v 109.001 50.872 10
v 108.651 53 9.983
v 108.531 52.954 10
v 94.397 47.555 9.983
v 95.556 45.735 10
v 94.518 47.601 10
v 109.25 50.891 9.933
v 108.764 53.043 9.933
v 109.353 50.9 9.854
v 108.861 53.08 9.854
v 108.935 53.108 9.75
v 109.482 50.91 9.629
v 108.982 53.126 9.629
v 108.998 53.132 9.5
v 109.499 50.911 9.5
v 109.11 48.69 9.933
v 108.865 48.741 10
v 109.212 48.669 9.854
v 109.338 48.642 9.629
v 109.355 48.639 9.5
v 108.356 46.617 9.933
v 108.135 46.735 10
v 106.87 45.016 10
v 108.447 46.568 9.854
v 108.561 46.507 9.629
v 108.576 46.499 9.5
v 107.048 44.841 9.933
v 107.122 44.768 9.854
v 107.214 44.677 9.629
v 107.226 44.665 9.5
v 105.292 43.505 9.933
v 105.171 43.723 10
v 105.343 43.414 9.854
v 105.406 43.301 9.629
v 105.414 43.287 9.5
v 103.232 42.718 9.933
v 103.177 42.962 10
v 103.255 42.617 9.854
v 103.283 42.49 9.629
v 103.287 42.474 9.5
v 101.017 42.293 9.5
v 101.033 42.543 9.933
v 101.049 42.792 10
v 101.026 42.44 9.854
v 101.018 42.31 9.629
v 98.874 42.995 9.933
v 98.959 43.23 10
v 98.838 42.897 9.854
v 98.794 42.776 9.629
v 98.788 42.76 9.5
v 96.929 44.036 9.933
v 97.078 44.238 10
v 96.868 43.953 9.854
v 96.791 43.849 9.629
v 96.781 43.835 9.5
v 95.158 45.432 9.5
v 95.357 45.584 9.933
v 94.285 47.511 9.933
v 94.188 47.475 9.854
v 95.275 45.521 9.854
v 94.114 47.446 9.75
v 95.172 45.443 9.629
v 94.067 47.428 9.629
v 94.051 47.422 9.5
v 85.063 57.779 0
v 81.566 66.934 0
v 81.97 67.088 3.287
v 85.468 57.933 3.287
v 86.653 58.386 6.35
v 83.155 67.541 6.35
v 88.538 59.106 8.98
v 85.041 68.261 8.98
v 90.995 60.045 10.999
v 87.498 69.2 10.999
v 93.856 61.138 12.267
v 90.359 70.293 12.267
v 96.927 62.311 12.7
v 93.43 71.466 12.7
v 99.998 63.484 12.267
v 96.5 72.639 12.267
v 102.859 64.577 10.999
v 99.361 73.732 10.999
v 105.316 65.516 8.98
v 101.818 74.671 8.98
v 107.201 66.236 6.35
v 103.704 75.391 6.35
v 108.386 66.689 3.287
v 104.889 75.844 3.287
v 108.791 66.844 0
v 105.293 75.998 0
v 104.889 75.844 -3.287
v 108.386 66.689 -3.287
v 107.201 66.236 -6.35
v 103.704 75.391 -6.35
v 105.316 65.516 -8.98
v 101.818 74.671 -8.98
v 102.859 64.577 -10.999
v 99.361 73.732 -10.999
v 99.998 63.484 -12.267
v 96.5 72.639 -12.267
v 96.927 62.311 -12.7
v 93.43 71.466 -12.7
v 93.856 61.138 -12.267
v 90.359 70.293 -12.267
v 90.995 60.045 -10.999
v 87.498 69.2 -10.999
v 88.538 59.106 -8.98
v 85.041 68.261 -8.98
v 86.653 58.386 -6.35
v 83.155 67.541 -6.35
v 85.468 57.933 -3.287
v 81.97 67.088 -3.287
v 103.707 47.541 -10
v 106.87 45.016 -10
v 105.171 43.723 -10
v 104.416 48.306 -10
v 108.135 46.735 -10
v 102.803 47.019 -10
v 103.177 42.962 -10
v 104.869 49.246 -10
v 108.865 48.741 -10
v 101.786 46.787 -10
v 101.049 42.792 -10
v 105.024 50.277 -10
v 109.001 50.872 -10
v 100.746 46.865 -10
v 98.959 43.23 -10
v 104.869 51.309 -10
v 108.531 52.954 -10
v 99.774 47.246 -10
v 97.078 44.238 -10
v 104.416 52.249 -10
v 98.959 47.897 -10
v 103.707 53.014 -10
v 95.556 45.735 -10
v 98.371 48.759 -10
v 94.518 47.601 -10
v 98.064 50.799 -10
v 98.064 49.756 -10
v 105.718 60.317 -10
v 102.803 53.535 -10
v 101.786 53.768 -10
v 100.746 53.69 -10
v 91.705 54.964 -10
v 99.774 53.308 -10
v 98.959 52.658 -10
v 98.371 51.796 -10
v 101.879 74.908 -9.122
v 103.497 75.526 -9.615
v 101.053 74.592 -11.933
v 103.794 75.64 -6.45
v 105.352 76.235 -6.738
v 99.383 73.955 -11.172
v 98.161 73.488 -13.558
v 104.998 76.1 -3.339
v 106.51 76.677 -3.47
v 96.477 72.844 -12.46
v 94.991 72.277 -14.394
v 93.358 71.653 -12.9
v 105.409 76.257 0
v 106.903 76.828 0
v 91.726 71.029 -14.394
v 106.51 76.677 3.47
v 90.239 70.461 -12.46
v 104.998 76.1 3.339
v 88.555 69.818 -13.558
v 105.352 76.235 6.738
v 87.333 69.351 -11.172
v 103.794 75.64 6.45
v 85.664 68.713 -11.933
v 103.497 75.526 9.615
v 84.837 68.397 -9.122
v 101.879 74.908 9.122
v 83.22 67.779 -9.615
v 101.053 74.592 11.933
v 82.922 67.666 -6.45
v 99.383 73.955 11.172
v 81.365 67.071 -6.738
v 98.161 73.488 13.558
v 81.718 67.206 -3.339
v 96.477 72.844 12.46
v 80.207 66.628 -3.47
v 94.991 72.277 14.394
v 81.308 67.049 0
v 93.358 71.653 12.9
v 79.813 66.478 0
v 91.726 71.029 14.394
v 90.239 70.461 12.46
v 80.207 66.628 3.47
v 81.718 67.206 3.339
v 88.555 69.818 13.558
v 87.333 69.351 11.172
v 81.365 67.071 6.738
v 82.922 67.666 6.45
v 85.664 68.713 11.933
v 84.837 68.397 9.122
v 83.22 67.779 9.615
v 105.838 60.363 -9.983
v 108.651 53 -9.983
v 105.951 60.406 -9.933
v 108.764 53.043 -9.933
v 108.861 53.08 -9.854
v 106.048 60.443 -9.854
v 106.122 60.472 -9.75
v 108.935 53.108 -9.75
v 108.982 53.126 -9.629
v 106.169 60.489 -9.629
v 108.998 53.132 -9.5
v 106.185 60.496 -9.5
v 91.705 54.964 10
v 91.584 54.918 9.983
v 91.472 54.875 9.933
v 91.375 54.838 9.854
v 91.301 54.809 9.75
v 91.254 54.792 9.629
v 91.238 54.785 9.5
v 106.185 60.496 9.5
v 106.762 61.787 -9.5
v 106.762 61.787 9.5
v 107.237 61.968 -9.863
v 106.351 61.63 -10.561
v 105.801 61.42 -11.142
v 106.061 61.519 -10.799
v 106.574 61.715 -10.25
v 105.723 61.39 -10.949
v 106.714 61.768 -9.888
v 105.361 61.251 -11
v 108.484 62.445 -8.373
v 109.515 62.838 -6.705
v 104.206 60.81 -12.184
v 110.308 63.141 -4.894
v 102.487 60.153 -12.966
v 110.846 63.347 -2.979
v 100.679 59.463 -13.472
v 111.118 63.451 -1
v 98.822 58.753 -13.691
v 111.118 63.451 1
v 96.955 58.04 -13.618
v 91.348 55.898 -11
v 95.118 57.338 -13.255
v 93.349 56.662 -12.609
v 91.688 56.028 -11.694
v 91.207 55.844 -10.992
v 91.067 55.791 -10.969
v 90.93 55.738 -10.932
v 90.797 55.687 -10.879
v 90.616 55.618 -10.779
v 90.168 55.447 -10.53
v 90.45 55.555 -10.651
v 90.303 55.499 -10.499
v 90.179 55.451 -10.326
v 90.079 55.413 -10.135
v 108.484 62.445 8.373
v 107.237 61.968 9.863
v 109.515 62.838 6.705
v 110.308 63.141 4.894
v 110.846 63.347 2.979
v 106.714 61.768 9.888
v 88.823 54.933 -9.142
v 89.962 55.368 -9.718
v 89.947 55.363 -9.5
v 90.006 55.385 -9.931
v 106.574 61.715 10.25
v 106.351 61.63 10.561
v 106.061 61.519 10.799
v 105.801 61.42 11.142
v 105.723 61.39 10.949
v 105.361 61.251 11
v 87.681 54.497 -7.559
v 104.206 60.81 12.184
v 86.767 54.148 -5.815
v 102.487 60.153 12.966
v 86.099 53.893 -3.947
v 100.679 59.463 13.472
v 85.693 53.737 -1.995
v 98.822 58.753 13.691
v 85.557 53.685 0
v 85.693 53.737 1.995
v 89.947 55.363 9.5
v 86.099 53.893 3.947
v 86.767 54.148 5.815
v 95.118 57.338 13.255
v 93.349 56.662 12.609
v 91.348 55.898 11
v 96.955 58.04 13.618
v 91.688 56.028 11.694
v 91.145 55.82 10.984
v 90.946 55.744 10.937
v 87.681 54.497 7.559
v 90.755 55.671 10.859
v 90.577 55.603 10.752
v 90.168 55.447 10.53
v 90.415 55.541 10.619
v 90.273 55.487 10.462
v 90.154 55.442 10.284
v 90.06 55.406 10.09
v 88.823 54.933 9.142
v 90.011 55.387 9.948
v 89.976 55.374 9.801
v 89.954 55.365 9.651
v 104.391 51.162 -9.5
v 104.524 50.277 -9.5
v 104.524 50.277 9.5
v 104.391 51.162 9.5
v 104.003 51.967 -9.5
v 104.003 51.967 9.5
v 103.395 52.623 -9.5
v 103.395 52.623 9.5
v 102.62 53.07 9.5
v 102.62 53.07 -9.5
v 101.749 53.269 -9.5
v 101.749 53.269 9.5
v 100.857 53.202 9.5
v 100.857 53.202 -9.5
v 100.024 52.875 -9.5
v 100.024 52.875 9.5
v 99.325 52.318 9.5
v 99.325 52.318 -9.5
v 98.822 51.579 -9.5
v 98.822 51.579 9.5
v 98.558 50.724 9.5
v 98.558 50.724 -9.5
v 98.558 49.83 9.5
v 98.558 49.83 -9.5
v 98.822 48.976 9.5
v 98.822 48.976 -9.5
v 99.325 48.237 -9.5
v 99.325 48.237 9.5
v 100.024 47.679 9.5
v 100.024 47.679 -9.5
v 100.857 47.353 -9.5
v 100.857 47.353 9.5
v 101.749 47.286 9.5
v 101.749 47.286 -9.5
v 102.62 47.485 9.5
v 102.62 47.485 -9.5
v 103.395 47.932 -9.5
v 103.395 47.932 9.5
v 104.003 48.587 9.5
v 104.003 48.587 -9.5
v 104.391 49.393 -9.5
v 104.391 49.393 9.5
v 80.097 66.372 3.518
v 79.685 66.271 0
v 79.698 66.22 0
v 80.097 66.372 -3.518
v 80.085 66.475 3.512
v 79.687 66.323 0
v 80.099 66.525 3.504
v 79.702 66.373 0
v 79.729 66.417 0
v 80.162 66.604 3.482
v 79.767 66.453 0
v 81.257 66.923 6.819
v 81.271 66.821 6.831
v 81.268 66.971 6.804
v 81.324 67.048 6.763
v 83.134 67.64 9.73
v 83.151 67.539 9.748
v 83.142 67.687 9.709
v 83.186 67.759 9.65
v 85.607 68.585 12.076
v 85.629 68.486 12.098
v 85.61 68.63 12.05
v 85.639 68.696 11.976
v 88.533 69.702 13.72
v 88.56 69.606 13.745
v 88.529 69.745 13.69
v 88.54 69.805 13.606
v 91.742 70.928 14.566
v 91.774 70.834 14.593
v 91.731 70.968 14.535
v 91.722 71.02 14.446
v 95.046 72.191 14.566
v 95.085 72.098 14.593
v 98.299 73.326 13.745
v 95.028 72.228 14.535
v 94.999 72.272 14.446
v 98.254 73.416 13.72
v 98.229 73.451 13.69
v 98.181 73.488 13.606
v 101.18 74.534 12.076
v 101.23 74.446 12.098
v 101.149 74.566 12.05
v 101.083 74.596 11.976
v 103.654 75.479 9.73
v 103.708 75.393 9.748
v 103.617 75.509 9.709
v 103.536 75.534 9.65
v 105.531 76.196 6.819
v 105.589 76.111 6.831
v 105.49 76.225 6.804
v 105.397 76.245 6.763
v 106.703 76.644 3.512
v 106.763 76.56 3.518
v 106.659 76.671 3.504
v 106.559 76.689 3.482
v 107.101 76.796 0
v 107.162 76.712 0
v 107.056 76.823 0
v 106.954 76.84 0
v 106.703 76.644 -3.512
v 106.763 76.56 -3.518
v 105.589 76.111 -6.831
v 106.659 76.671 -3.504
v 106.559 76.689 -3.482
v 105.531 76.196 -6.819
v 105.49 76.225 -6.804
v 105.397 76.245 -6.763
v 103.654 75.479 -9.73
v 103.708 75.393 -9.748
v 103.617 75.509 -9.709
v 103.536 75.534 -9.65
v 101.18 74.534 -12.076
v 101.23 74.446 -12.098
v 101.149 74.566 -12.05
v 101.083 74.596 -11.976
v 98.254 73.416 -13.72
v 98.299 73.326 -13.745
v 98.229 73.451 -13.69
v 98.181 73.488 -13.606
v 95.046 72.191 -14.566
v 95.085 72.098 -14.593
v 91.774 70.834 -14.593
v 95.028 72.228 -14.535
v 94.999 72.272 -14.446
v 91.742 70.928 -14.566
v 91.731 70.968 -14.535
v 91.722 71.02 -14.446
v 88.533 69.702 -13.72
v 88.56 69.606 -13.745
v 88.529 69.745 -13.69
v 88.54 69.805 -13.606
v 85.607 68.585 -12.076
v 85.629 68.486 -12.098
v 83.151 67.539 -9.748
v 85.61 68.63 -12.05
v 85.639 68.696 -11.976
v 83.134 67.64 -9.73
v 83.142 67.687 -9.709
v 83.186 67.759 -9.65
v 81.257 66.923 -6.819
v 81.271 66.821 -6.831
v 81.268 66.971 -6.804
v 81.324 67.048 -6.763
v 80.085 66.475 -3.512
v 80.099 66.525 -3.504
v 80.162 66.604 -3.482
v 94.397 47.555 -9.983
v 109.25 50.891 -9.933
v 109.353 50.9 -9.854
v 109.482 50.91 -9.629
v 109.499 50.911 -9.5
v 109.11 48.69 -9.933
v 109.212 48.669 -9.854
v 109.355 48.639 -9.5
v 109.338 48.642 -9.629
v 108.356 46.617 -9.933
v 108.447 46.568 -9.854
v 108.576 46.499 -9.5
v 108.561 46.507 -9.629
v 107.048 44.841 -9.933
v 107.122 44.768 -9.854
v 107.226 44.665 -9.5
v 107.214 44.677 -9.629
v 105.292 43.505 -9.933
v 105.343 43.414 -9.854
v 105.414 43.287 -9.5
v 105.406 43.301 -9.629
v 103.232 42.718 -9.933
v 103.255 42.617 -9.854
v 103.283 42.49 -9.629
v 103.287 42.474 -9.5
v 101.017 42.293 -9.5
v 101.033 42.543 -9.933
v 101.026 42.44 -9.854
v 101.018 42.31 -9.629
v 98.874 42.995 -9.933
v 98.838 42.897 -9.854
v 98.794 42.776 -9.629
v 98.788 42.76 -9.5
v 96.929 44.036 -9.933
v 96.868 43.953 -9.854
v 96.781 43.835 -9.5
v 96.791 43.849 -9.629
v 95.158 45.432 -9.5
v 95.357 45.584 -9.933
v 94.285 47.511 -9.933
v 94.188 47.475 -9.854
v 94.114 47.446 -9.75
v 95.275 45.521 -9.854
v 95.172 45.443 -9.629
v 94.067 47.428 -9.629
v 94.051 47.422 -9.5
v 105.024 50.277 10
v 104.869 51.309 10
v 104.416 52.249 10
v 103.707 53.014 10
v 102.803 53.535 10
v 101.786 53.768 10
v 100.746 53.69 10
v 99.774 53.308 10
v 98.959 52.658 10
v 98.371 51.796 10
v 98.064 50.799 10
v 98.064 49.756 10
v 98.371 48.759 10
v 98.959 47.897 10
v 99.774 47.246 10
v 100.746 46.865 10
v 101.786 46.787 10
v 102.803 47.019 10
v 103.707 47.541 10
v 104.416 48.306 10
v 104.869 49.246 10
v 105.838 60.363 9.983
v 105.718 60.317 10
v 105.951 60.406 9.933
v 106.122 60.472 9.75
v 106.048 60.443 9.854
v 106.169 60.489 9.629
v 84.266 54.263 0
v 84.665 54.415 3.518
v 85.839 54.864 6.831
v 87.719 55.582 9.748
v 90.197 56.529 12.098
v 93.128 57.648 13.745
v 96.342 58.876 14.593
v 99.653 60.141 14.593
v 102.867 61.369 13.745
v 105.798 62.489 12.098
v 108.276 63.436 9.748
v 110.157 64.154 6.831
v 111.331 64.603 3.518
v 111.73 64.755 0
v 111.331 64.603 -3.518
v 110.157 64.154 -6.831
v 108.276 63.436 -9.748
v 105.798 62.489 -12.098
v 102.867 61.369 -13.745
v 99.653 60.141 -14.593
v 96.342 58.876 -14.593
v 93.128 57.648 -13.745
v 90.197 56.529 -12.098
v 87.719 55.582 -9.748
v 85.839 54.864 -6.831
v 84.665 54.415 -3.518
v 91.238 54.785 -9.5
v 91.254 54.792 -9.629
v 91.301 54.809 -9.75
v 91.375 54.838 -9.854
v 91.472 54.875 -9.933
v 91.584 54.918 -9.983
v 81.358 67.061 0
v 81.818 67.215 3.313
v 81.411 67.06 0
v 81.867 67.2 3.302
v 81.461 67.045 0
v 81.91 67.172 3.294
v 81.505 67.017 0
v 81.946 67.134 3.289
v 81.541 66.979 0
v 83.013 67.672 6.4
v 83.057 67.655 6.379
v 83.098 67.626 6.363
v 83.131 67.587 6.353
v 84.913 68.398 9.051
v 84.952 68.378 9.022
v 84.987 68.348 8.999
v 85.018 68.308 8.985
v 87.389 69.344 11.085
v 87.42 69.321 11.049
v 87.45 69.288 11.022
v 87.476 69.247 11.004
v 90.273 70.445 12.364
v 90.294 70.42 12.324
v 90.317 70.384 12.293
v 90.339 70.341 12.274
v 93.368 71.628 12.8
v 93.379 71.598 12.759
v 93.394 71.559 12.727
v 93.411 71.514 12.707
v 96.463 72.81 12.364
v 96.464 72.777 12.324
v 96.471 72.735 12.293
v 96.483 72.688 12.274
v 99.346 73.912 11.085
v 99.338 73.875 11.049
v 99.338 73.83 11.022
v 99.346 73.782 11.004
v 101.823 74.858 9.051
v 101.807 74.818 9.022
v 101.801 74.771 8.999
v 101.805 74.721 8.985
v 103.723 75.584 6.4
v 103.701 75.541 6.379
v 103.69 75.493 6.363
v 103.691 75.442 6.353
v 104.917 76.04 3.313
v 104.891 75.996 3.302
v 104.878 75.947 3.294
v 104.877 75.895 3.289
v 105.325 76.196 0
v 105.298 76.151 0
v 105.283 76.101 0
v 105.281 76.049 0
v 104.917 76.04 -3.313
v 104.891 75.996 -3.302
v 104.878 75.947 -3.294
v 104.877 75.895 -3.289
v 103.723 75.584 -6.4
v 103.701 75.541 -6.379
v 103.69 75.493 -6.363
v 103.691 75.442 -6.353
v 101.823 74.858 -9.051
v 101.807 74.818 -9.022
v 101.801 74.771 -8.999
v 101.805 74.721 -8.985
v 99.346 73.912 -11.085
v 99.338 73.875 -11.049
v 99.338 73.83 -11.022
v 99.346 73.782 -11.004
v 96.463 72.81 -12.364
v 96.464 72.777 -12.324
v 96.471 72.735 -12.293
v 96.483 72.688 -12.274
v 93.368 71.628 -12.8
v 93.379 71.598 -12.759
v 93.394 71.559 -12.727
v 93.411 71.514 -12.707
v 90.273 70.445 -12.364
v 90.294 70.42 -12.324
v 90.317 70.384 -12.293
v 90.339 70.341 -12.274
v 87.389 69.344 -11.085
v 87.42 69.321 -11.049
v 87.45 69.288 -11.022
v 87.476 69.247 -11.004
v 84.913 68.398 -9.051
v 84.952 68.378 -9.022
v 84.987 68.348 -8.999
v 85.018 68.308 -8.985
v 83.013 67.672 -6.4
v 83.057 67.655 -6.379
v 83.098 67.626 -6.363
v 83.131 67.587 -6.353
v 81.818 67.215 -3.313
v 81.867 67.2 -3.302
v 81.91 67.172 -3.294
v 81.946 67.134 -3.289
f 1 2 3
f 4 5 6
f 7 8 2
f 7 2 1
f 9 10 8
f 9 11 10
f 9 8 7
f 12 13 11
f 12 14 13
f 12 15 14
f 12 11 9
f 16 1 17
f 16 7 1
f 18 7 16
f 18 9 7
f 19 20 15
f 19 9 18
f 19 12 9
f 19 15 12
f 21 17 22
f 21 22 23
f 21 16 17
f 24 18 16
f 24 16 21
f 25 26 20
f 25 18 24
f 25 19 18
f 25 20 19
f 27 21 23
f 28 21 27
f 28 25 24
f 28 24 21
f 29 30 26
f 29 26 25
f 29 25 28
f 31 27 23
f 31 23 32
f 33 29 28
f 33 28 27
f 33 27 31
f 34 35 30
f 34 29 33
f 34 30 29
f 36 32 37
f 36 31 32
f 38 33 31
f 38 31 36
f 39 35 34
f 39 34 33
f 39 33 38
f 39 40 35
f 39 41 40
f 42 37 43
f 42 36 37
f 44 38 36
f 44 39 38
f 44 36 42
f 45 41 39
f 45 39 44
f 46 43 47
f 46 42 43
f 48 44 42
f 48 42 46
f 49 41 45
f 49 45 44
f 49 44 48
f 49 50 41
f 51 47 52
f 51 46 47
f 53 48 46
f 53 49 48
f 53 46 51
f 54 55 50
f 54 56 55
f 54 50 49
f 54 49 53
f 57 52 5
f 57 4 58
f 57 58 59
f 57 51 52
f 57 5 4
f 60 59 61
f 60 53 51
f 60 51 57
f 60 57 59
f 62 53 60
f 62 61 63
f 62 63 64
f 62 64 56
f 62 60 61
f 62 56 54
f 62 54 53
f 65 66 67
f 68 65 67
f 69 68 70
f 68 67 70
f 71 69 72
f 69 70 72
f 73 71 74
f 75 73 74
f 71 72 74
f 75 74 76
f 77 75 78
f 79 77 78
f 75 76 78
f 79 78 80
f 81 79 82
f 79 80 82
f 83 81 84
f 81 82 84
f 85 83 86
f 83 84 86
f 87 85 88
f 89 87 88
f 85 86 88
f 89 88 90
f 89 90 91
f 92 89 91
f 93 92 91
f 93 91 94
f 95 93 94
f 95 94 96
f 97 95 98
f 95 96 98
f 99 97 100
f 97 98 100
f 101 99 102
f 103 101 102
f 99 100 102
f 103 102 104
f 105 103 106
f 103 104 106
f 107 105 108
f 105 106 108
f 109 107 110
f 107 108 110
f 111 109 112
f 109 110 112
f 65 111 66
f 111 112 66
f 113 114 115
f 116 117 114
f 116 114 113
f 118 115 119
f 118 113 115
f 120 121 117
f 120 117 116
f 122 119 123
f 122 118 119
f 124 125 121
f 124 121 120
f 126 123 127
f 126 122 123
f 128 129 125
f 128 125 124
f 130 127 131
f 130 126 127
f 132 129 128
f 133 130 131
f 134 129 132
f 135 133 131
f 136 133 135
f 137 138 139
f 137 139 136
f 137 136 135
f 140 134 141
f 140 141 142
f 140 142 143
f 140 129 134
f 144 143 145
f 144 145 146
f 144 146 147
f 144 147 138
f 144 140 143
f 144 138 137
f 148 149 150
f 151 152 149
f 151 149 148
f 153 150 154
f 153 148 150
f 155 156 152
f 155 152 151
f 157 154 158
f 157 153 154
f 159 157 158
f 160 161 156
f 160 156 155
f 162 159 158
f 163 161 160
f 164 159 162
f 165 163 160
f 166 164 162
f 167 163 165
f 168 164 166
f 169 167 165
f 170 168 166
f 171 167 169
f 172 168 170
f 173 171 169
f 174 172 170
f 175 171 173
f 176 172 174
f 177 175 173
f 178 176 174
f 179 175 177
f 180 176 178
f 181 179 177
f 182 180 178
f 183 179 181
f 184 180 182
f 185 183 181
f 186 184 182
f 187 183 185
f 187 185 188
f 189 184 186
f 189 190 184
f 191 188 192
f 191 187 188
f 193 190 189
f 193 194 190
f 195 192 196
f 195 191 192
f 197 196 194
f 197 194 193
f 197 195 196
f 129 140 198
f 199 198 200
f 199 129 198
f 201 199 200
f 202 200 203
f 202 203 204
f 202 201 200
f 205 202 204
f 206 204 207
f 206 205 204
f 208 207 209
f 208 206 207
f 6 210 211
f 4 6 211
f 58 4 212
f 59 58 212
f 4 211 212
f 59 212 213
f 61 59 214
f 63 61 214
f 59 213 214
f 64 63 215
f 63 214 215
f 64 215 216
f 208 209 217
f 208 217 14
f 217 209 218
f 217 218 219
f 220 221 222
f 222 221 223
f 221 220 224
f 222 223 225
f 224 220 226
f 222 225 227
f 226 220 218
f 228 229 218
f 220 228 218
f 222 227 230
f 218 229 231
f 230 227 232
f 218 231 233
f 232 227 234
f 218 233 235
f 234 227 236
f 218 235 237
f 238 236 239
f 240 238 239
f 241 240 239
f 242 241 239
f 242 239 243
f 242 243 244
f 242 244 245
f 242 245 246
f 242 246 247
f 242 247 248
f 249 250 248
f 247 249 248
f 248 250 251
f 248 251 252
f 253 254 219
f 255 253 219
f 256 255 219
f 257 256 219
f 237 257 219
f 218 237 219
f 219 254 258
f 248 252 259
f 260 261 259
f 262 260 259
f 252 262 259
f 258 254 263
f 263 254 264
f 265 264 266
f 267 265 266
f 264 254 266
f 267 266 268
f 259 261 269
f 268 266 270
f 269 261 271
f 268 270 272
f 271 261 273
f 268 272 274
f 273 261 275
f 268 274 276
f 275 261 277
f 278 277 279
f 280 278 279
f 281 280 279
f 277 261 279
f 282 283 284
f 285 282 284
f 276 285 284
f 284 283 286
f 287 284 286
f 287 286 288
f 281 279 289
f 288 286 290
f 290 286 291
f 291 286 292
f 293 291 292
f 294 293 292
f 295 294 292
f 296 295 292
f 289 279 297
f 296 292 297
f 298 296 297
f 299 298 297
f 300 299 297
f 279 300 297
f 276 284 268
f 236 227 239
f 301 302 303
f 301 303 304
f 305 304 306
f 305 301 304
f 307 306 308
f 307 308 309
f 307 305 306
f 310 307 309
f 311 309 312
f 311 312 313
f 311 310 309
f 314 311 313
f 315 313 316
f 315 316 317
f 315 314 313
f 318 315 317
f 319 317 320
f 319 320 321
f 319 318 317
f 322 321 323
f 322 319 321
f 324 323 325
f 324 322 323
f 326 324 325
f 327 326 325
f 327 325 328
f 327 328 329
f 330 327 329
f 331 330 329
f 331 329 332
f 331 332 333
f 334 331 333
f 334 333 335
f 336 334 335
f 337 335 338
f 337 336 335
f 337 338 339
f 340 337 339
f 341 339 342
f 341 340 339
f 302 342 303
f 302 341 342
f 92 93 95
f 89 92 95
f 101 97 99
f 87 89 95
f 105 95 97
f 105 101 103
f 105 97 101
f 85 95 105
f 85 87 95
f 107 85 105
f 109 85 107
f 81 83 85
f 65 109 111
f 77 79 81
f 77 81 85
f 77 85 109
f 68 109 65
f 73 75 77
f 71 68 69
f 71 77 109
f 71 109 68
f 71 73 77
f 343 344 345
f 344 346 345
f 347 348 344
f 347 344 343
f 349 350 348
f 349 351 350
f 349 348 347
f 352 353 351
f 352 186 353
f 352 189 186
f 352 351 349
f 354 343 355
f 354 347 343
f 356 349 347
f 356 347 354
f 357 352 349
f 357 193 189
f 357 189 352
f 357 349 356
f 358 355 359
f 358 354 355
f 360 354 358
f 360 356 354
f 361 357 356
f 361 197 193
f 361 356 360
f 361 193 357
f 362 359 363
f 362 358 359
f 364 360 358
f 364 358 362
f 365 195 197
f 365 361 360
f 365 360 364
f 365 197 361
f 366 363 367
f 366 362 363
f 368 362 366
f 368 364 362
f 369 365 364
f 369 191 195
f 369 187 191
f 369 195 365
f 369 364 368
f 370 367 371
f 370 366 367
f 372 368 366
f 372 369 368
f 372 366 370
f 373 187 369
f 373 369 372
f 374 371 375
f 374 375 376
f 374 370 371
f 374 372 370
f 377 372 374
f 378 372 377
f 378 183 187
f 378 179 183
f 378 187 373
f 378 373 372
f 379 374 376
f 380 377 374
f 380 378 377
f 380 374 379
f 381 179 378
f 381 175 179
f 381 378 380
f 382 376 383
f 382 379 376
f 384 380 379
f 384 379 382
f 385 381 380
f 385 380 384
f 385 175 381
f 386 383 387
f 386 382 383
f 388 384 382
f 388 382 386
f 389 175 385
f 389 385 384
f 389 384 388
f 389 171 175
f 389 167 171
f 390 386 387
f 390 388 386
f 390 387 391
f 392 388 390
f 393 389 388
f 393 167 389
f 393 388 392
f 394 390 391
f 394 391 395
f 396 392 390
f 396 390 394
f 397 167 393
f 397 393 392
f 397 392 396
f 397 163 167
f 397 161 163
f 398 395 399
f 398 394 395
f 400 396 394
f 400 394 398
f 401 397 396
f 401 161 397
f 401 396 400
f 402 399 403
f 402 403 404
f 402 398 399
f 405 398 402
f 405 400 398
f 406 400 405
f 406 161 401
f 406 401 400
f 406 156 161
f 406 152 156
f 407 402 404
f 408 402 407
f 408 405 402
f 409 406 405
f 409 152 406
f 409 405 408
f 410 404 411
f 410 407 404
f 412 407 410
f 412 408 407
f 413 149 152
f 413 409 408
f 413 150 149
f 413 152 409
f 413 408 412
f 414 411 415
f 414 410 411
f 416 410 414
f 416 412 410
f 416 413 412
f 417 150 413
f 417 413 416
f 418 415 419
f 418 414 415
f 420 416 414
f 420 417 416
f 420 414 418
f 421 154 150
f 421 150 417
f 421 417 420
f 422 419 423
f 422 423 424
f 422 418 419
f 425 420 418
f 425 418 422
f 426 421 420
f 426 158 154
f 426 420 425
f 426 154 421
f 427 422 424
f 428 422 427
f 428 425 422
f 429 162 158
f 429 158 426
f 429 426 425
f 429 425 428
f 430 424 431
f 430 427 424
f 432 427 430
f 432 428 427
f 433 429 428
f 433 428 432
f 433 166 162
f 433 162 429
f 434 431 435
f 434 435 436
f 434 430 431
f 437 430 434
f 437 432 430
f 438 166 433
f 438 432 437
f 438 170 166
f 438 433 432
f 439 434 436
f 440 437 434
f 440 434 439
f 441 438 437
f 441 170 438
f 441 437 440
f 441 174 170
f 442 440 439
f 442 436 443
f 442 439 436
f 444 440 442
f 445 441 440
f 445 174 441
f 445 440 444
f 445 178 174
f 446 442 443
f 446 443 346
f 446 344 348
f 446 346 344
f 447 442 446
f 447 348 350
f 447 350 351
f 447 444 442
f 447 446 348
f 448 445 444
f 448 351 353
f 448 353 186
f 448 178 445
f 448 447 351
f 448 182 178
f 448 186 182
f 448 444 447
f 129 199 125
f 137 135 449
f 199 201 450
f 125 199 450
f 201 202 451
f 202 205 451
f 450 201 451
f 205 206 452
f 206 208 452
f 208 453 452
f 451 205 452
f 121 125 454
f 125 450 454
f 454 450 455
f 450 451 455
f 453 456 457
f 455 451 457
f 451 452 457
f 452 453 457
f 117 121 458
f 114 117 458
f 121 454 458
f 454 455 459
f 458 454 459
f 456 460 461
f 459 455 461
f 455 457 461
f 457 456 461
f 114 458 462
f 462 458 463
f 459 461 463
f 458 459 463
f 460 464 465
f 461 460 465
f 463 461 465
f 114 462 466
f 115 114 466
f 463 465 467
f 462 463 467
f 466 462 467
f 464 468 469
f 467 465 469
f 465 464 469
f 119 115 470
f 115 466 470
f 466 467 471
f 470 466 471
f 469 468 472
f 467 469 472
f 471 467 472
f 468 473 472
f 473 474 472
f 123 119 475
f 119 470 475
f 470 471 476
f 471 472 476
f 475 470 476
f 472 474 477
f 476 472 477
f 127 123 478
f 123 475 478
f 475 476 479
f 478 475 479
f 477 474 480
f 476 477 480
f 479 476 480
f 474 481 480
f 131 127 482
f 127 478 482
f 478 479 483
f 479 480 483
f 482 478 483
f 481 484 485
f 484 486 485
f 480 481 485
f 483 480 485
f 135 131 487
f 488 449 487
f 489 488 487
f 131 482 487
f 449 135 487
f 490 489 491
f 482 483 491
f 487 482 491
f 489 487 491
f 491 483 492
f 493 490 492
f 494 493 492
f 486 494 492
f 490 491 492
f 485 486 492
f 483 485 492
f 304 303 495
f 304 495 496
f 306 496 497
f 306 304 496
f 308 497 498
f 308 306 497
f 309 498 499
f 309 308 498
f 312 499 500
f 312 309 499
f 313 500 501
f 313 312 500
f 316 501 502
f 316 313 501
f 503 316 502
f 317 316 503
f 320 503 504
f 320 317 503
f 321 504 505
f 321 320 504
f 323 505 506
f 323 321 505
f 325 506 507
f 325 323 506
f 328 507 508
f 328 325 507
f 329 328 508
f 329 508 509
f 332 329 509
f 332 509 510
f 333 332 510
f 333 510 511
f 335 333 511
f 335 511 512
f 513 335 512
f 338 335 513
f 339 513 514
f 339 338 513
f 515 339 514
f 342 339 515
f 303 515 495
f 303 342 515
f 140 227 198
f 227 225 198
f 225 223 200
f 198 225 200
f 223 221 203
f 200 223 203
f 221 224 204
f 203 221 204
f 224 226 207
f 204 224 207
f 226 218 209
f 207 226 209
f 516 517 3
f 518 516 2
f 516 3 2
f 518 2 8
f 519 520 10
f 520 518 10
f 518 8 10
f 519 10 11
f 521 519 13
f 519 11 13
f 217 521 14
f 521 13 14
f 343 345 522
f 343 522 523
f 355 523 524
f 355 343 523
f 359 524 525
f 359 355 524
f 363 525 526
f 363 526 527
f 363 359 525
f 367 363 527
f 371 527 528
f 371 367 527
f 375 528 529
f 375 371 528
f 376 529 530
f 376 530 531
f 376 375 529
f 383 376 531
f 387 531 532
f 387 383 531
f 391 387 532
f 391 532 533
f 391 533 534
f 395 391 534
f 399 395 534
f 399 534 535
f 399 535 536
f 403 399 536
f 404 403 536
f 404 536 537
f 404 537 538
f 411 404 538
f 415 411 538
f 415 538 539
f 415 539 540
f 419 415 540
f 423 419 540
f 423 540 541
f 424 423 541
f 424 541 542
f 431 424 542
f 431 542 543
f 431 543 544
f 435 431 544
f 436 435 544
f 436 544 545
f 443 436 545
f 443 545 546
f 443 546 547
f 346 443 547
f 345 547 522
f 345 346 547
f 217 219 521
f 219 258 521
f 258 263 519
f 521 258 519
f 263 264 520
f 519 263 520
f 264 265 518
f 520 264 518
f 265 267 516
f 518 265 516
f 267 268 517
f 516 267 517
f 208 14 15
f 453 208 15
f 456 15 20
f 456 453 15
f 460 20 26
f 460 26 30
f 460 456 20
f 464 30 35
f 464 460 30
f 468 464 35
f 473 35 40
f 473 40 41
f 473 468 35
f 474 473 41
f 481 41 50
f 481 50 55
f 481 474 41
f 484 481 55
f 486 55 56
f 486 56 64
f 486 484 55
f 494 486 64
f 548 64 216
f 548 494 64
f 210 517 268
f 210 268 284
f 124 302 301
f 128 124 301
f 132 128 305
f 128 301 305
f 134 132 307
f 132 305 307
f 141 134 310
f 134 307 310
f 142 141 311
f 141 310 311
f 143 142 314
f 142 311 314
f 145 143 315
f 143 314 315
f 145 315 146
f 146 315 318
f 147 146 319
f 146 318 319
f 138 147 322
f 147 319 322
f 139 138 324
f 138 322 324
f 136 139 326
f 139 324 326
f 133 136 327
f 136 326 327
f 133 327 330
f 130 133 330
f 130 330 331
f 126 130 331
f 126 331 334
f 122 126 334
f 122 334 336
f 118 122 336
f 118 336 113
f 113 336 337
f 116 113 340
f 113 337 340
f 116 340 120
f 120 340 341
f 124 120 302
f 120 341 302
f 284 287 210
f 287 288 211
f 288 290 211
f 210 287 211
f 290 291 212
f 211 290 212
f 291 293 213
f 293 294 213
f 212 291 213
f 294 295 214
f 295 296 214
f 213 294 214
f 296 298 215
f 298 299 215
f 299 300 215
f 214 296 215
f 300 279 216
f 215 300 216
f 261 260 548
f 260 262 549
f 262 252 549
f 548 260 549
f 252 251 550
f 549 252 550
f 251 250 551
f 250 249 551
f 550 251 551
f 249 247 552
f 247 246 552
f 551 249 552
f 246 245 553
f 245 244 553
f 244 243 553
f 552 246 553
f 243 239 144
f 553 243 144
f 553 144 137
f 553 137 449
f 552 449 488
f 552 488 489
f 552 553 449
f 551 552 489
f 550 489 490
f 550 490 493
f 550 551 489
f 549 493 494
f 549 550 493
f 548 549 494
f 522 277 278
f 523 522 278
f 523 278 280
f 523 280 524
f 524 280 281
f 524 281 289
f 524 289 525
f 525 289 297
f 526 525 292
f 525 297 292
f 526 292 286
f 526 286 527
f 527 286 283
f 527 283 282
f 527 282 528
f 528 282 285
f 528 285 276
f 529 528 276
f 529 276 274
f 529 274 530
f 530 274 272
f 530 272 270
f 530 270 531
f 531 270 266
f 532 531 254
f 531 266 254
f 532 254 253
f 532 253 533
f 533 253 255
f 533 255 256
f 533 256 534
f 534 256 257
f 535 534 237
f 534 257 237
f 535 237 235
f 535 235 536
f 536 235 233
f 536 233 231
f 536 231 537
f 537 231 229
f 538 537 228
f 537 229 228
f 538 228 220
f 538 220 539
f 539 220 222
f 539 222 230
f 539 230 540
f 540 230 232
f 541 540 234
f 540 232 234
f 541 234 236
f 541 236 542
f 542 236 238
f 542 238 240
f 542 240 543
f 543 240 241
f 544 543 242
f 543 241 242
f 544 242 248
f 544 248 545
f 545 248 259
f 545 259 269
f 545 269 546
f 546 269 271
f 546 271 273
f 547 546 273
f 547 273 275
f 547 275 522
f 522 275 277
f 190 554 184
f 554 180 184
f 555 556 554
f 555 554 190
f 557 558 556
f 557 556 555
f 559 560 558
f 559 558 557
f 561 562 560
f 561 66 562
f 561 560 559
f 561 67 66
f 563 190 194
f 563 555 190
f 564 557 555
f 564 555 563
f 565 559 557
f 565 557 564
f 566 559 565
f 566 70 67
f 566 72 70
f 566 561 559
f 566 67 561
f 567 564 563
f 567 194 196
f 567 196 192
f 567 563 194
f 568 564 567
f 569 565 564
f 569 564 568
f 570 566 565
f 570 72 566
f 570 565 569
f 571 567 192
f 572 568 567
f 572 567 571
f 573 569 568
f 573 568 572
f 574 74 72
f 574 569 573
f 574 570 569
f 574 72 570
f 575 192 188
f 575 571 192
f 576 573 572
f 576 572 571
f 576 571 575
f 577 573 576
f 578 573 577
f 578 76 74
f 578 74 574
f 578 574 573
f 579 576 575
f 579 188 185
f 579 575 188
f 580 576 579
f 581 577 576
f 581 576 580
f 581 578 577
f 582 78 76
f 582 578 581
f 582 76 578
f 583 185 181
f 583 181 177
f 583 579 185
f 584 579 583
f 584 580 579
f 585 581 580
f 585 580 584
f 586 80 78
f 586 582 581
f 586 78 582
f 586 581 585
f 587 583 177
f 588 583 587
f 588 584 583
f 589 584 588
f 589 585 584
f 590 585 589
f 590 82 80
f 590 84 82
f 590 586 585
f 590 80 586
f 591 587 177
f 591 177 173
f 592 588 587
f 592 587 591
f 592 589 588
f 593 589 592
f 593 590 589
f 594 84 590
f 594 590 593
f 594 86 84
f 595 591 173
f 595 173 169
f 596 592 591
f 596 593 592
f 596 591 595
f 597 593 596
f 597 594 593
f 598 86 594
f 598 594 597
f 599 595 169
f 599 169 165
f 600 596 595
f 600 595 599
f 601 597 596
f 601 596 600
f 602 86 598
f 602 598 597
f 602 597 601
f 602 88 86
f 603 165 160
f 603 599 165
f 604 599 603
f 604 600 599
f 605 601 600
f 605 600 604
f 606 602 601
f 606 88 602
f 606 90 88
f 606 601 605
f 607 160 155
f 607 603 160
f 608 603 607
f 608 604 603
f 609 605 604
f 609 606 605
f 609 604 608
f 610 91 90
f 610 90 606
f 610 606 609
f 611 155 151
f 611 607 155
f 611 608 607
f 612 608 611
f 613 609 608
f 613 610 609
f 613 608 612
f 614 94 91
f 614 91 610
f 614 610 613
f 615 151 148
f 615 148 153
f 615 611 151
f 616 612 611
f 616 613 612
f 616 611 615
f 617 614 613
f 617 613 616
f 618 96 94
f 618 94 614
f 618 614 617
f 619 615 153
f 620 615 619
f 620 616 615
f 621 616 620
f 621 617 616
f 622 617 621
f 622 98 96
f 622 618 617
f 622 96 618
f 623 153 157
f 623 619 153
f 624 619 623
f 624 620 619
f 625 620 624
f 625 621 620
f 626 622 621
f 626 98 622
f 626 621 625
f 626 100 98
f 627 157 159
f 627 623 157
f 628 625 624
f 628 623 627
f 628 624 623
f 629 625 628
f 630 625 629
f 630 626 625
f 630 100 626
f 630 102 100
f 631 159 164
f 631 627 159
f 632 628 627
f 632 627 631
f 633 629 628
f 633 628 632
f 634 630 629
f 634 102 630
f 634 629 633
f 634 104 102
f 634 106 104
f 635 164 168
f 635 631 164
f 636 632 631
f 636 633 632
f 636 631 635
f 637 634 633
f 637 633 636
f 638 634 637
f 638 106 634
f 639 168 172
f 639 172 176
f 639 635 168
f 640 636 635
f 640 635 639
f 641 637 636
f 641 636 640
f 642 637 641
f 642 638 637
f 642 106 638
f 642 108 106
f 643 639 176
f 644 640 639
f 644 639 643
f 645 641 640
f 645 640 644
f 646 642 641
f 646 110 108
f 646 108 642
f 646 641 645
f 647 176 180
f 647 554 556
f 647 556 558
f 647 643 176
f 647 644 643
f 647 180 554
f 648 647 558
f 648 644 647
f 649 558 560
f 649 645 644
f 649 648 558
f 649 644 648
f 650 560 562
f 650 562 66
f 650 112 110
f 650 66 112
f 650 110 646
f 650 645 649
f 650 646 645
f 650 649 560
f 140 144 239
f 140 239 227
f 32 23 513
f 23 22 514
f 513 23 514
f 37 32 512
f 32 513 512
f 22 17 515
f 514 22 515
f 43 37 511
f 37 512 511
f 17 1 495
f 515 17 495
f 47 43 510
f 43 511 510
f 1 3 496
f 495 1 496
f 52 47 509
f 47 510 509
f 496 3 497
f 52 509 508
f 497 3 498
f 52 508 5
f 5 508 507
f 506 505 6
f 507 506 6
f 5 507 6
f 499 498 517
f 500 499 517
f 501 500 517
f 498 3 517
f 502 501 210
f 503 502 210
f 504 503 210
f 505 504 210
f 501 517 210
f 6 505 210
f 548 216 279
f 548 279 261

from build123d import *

# Parameters (mm, degrees)
BOSS_EXTRUDE1_DEPTH      = 10
BOSS_EXTRUDE1_DEPTH_BACK = 10
SKETCH2_R                = 3
BOSS_EXTRUDE2_DEPTH      = 1.5
BOSS_EXTRUDE2_DEPTH_BACK = 2.5
SKETCH3_R                = 15.7
BOSS_EXTRUDE4_START      = 10
SKETCH4_R                = 15.7
SKETCH4_R_2              = 12.7
BOSS_EXTRUDE4_DEPTH      = 10
FILLET6_R                = 0.5
CHAMFER1_SIZE            = 0.5
SKETCH5_R                = 19.89902312
SKETCH5_R_2              = 14.7
CUT_EXTRUDE2_DEPTH       = 135.083701085
FILLET7_R                = 0.2
CHAMFER3_SIZE            = 1


with BuildPart() as part:
    # Sketch2 → Boss-Extrude1 (new, two sides: drawn at the far end of the back side and taken through both)
    with BuildSketch(Plane.XY.offset(-BOSS_EXTRUDE1_DEPTH_BACK)):
        with BuildLine():
            Line((94.051269644, 47.422261979), (89.989154813, 58.054980417))
            Line((89.989154813, 58.054980417), (104.935548085, 63.765087962))
            Line((104.935548085, 63.765087962), (108.997662915, 53.132369524))
            ThreePointArc((108.997662915, 53.132369524), (104.379520052, 42.804119115), (94.051269644, 47.422261979))
        make_face()
        with Locations((101.52446628, 50.277315751)):
            Circle(SKETCH2_R, mode=Mode.SUBTRACT)
    extrude(amount=BOSS_EXTRUDE1_DEPTH + BOSS_EXTRUDE1_DEPTH_BACK)

    # Sketch3 → Boss-Extrude2 (add, two sides: drawn at the far end of the back side and taken through both)
    with BuildSketch(Plane(origin=(-7.892992814, 20.660166865, 0), x_dir=(0.9341495794706384, 0.3568817215476715, 0), z_dir=(-0.3568817215476715, 0.9341495794706384, 0)).offset(-BOSS_EXTRUDE2_DEPTH_BACK)):
        with Locations((112.782092481, 0)):
            Circle(SKETCH3_R)
    extrude(amount=BOSS_EXTRUDE2_DEPTH + BOSS_EXTRUDE2_DEPTH_BACK)

    # Sketch4 → Boss-Extrude4 (add)
    with BuildSketch(Plane(origin=(-8.428315397, 22.061391234, 0), x_dir=(0.9341495794706381, 0.3568817215476716, 0), z_dir=(-0.3568817215476716, 0.9341495794706383, 0)).offset(BOSS_EXTRUDE4_START)):
        with Locations((112.782092481, 0)):
            Circle(SKETCH4_R)
        with Locations((112.782092481, 0)):
            Circle(SKETCH4_R_2, mode=Mode.SUBTRACT)
    extrude(amount=-BOSS_EXTRUDE4_DEPTH)

    # Fillet6
    fillet6_edges = [part.edges().sort_by_distance(p)[0] for p in [
        (107.412707652, 57.281041768, -10),
        (104.379520052, 42.804119115, -10),
        (92.46631438, 51.570934224, -10),
        (107.412707652, 57.281041768, 10),
        (104.379520052, 42.804119115, 10),
        (92.46631438, 51.570934224, 10),
    ]]
    fillet(fillet6_edges, radius=FILLET6_R)

    # Chamfer1
    chamfer1_edges = [part.edges().sort_by_distance(p)[0] for p in [
        (98.52446628, 50.277315751, 10),
        (98.52446628, 50.277315751, -10),
    ]]
    chamfer(chamfer1_edges, length=CHAMFER1_SIZE)

    # Sketch5 → Cut-Extrude2 (cut, through all)
    with BuildSketch(Plane(origin=(-11.997132612, 31.402887029, 0), x_dir=(0.9341495794706383, 0.35688172154767156, 0), z_dir=(-0.35688172154767156, 0.9341495794706383, 0))):
        with Locations((112.782092481, 0)):
            Circle(SKETCH5_R)
        with Locations((112.782092481, 0)):
            Circle(SKETCH5_R_2, mode=Mode.SUBTRACT)
    extrude(amount=-CUT_EXTRUDE2_DEPTH, mode=Mode.SUBTRACT)

    # Fillet7
    fillet7_edges = [part.edges().sort_by_distance(p)[0] for p in [
        (79.626212833, 66.406593047, 0),
        (81.494511992, 67.12035649, 0),
    ]]
    fillet(fillet7_edges, radius=FILLET7_R)

    # Chamfer3
    chamfer3_edges = [part.edges().sort_by_distance(p)[0] for p in [
        (84.622556934, 53.328498934, 0),
        (105.69094935, 61.377449895, 9.853553391),
        (98.354555753, 58.574660241, 10),
        (91.018162155, 55.771870587, 9.853553391),
        (90.881359117, 55.719606469, 0),
        (91.018162155, 55.771870587, -9.853553391),
        (98.354555753, 58.574660241, -10),
        (105.69094935, 61.377449895, -9.853553391),
        (105.827752388, 61.429714013, 0),
    ]]
    chamfer(chamfer3_edges, length=CHAMFER3_SIZE)


solid = part.part
